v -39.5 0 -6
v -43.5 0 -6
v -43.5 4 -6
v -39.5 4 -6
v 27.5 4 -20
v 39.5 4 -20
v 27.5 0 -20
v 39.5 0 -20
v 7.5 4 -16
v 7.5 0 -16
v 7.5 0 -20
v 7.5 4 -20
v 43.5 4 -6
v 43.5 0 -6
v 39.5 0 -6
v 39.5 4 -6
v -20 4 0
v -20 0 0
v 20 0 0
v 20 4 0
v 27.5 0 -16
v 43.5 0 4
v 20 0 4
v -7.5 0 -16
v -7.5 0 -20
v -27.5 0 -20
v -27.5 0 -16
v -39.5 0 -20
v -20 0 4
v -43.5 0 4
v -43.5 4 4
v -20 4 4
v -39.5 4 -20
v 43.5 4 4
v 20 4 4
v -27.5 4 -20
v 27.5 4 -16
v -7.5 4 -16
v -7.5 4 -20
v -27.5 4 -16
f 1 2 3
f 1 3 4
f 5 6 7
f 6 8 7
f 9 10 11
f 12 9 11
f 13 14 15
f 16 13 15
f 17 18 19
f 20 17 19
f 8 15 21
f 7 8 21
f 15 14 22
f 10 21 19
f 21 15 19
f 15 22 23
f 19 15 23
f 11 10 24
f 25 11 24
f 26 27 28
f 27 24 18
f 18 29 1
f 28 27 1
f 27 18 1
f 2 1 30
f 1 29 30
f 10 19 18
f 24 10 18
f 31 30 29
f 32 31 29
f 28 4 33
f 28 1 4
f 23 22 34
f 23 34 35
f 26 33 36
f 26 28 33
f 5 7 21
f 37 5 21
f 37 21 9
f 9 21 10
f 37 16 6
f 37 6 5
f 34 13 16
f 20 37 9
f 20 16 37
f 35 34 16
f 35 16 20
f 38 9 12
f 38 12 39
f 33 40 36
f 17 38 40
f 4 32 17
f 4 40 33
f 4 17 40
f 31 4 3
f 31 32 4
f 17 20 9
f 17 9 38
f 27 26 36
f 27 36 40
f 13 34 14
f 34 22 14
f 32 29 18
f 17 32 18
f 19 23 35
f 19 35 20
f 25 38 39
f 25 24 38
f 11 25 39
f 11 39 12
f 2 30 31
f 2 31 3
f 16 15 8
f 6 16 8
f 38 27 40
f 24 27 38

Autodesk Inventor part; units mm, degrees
ref_plane "YZ Plane" through (0, 0, 0) normal (1, 0, 0) x (0, 1, 0)
ref_plane "XZ Plane" through (0, 0, 0) normal (0, 1, 0) x (-1, 0, 0)
ref_plane "XY Plane" through (0, 0, 0) normal (0, 0, 1) x (1, 0, 0)
sketch "Эскиз1" plane through (0, 0, 0) normal (0, 1, 0) x (-1, 0, 0)
  line L0 (43.5, 4) -> (43.5, -6)
  line L1 (43.5, -6) -> (39.5, -6)
  line L2 (39.5, -6) -> (39.5, -20)
  line L3 (39.5, -20) -> (27.5, -20)
  line L4 (27.5, -20) -> (27.5, -16)
  line L5 (27.5, -16) -> (7.5, -16)
  line L6 (7.5, -16) -> (7.5, -20)
  line L7 (7.5, -20) -> (0, -20)
  line L8 (0, -20) -> (0, 0)
  line L9 (-43.5, 4) -> (-43.5, -6)
  line L10 (-43.5, -6) -> (-39.5, -6)
  line L11 (-39.5, -6) -> (-39.5, -20)
  line L12 (-39.5, -20) -> (-27.5, -20)
  line L13 (-27.5, -20) -> (-27.5, -16)
  line L14 (-27.5, -16) -> (-7.5, -16)
  line L15 (-7.5, -16) -> (-7.5, -20)
  line L16 (-7.5, -20) -> (0, -20)
  line L17 (43.5, 4) -> (20, 4)
  line L18 (20, 4) -> (20, 0)
  line L19 (20, 0) -> (0, 0)
  line L20 (-43.5, 4) -> (-20, 4)
  line L21 (-20, 4) -> (-20, 0)
  line L22 (-20, 0) -> (0, 0)
  dimension "d0" = 12
  dimension "d1" = 20
  dimension "d2" = 15
  dimension "d3" = 4
  dimension "d4" = 14
  dimension "d5" = 10
  dimension "d8" = 40
extrude "Выдавливание1" add sketch "Эскиз1" along normal blind 4
properties part number "batN" material "Дерево (береза)"
